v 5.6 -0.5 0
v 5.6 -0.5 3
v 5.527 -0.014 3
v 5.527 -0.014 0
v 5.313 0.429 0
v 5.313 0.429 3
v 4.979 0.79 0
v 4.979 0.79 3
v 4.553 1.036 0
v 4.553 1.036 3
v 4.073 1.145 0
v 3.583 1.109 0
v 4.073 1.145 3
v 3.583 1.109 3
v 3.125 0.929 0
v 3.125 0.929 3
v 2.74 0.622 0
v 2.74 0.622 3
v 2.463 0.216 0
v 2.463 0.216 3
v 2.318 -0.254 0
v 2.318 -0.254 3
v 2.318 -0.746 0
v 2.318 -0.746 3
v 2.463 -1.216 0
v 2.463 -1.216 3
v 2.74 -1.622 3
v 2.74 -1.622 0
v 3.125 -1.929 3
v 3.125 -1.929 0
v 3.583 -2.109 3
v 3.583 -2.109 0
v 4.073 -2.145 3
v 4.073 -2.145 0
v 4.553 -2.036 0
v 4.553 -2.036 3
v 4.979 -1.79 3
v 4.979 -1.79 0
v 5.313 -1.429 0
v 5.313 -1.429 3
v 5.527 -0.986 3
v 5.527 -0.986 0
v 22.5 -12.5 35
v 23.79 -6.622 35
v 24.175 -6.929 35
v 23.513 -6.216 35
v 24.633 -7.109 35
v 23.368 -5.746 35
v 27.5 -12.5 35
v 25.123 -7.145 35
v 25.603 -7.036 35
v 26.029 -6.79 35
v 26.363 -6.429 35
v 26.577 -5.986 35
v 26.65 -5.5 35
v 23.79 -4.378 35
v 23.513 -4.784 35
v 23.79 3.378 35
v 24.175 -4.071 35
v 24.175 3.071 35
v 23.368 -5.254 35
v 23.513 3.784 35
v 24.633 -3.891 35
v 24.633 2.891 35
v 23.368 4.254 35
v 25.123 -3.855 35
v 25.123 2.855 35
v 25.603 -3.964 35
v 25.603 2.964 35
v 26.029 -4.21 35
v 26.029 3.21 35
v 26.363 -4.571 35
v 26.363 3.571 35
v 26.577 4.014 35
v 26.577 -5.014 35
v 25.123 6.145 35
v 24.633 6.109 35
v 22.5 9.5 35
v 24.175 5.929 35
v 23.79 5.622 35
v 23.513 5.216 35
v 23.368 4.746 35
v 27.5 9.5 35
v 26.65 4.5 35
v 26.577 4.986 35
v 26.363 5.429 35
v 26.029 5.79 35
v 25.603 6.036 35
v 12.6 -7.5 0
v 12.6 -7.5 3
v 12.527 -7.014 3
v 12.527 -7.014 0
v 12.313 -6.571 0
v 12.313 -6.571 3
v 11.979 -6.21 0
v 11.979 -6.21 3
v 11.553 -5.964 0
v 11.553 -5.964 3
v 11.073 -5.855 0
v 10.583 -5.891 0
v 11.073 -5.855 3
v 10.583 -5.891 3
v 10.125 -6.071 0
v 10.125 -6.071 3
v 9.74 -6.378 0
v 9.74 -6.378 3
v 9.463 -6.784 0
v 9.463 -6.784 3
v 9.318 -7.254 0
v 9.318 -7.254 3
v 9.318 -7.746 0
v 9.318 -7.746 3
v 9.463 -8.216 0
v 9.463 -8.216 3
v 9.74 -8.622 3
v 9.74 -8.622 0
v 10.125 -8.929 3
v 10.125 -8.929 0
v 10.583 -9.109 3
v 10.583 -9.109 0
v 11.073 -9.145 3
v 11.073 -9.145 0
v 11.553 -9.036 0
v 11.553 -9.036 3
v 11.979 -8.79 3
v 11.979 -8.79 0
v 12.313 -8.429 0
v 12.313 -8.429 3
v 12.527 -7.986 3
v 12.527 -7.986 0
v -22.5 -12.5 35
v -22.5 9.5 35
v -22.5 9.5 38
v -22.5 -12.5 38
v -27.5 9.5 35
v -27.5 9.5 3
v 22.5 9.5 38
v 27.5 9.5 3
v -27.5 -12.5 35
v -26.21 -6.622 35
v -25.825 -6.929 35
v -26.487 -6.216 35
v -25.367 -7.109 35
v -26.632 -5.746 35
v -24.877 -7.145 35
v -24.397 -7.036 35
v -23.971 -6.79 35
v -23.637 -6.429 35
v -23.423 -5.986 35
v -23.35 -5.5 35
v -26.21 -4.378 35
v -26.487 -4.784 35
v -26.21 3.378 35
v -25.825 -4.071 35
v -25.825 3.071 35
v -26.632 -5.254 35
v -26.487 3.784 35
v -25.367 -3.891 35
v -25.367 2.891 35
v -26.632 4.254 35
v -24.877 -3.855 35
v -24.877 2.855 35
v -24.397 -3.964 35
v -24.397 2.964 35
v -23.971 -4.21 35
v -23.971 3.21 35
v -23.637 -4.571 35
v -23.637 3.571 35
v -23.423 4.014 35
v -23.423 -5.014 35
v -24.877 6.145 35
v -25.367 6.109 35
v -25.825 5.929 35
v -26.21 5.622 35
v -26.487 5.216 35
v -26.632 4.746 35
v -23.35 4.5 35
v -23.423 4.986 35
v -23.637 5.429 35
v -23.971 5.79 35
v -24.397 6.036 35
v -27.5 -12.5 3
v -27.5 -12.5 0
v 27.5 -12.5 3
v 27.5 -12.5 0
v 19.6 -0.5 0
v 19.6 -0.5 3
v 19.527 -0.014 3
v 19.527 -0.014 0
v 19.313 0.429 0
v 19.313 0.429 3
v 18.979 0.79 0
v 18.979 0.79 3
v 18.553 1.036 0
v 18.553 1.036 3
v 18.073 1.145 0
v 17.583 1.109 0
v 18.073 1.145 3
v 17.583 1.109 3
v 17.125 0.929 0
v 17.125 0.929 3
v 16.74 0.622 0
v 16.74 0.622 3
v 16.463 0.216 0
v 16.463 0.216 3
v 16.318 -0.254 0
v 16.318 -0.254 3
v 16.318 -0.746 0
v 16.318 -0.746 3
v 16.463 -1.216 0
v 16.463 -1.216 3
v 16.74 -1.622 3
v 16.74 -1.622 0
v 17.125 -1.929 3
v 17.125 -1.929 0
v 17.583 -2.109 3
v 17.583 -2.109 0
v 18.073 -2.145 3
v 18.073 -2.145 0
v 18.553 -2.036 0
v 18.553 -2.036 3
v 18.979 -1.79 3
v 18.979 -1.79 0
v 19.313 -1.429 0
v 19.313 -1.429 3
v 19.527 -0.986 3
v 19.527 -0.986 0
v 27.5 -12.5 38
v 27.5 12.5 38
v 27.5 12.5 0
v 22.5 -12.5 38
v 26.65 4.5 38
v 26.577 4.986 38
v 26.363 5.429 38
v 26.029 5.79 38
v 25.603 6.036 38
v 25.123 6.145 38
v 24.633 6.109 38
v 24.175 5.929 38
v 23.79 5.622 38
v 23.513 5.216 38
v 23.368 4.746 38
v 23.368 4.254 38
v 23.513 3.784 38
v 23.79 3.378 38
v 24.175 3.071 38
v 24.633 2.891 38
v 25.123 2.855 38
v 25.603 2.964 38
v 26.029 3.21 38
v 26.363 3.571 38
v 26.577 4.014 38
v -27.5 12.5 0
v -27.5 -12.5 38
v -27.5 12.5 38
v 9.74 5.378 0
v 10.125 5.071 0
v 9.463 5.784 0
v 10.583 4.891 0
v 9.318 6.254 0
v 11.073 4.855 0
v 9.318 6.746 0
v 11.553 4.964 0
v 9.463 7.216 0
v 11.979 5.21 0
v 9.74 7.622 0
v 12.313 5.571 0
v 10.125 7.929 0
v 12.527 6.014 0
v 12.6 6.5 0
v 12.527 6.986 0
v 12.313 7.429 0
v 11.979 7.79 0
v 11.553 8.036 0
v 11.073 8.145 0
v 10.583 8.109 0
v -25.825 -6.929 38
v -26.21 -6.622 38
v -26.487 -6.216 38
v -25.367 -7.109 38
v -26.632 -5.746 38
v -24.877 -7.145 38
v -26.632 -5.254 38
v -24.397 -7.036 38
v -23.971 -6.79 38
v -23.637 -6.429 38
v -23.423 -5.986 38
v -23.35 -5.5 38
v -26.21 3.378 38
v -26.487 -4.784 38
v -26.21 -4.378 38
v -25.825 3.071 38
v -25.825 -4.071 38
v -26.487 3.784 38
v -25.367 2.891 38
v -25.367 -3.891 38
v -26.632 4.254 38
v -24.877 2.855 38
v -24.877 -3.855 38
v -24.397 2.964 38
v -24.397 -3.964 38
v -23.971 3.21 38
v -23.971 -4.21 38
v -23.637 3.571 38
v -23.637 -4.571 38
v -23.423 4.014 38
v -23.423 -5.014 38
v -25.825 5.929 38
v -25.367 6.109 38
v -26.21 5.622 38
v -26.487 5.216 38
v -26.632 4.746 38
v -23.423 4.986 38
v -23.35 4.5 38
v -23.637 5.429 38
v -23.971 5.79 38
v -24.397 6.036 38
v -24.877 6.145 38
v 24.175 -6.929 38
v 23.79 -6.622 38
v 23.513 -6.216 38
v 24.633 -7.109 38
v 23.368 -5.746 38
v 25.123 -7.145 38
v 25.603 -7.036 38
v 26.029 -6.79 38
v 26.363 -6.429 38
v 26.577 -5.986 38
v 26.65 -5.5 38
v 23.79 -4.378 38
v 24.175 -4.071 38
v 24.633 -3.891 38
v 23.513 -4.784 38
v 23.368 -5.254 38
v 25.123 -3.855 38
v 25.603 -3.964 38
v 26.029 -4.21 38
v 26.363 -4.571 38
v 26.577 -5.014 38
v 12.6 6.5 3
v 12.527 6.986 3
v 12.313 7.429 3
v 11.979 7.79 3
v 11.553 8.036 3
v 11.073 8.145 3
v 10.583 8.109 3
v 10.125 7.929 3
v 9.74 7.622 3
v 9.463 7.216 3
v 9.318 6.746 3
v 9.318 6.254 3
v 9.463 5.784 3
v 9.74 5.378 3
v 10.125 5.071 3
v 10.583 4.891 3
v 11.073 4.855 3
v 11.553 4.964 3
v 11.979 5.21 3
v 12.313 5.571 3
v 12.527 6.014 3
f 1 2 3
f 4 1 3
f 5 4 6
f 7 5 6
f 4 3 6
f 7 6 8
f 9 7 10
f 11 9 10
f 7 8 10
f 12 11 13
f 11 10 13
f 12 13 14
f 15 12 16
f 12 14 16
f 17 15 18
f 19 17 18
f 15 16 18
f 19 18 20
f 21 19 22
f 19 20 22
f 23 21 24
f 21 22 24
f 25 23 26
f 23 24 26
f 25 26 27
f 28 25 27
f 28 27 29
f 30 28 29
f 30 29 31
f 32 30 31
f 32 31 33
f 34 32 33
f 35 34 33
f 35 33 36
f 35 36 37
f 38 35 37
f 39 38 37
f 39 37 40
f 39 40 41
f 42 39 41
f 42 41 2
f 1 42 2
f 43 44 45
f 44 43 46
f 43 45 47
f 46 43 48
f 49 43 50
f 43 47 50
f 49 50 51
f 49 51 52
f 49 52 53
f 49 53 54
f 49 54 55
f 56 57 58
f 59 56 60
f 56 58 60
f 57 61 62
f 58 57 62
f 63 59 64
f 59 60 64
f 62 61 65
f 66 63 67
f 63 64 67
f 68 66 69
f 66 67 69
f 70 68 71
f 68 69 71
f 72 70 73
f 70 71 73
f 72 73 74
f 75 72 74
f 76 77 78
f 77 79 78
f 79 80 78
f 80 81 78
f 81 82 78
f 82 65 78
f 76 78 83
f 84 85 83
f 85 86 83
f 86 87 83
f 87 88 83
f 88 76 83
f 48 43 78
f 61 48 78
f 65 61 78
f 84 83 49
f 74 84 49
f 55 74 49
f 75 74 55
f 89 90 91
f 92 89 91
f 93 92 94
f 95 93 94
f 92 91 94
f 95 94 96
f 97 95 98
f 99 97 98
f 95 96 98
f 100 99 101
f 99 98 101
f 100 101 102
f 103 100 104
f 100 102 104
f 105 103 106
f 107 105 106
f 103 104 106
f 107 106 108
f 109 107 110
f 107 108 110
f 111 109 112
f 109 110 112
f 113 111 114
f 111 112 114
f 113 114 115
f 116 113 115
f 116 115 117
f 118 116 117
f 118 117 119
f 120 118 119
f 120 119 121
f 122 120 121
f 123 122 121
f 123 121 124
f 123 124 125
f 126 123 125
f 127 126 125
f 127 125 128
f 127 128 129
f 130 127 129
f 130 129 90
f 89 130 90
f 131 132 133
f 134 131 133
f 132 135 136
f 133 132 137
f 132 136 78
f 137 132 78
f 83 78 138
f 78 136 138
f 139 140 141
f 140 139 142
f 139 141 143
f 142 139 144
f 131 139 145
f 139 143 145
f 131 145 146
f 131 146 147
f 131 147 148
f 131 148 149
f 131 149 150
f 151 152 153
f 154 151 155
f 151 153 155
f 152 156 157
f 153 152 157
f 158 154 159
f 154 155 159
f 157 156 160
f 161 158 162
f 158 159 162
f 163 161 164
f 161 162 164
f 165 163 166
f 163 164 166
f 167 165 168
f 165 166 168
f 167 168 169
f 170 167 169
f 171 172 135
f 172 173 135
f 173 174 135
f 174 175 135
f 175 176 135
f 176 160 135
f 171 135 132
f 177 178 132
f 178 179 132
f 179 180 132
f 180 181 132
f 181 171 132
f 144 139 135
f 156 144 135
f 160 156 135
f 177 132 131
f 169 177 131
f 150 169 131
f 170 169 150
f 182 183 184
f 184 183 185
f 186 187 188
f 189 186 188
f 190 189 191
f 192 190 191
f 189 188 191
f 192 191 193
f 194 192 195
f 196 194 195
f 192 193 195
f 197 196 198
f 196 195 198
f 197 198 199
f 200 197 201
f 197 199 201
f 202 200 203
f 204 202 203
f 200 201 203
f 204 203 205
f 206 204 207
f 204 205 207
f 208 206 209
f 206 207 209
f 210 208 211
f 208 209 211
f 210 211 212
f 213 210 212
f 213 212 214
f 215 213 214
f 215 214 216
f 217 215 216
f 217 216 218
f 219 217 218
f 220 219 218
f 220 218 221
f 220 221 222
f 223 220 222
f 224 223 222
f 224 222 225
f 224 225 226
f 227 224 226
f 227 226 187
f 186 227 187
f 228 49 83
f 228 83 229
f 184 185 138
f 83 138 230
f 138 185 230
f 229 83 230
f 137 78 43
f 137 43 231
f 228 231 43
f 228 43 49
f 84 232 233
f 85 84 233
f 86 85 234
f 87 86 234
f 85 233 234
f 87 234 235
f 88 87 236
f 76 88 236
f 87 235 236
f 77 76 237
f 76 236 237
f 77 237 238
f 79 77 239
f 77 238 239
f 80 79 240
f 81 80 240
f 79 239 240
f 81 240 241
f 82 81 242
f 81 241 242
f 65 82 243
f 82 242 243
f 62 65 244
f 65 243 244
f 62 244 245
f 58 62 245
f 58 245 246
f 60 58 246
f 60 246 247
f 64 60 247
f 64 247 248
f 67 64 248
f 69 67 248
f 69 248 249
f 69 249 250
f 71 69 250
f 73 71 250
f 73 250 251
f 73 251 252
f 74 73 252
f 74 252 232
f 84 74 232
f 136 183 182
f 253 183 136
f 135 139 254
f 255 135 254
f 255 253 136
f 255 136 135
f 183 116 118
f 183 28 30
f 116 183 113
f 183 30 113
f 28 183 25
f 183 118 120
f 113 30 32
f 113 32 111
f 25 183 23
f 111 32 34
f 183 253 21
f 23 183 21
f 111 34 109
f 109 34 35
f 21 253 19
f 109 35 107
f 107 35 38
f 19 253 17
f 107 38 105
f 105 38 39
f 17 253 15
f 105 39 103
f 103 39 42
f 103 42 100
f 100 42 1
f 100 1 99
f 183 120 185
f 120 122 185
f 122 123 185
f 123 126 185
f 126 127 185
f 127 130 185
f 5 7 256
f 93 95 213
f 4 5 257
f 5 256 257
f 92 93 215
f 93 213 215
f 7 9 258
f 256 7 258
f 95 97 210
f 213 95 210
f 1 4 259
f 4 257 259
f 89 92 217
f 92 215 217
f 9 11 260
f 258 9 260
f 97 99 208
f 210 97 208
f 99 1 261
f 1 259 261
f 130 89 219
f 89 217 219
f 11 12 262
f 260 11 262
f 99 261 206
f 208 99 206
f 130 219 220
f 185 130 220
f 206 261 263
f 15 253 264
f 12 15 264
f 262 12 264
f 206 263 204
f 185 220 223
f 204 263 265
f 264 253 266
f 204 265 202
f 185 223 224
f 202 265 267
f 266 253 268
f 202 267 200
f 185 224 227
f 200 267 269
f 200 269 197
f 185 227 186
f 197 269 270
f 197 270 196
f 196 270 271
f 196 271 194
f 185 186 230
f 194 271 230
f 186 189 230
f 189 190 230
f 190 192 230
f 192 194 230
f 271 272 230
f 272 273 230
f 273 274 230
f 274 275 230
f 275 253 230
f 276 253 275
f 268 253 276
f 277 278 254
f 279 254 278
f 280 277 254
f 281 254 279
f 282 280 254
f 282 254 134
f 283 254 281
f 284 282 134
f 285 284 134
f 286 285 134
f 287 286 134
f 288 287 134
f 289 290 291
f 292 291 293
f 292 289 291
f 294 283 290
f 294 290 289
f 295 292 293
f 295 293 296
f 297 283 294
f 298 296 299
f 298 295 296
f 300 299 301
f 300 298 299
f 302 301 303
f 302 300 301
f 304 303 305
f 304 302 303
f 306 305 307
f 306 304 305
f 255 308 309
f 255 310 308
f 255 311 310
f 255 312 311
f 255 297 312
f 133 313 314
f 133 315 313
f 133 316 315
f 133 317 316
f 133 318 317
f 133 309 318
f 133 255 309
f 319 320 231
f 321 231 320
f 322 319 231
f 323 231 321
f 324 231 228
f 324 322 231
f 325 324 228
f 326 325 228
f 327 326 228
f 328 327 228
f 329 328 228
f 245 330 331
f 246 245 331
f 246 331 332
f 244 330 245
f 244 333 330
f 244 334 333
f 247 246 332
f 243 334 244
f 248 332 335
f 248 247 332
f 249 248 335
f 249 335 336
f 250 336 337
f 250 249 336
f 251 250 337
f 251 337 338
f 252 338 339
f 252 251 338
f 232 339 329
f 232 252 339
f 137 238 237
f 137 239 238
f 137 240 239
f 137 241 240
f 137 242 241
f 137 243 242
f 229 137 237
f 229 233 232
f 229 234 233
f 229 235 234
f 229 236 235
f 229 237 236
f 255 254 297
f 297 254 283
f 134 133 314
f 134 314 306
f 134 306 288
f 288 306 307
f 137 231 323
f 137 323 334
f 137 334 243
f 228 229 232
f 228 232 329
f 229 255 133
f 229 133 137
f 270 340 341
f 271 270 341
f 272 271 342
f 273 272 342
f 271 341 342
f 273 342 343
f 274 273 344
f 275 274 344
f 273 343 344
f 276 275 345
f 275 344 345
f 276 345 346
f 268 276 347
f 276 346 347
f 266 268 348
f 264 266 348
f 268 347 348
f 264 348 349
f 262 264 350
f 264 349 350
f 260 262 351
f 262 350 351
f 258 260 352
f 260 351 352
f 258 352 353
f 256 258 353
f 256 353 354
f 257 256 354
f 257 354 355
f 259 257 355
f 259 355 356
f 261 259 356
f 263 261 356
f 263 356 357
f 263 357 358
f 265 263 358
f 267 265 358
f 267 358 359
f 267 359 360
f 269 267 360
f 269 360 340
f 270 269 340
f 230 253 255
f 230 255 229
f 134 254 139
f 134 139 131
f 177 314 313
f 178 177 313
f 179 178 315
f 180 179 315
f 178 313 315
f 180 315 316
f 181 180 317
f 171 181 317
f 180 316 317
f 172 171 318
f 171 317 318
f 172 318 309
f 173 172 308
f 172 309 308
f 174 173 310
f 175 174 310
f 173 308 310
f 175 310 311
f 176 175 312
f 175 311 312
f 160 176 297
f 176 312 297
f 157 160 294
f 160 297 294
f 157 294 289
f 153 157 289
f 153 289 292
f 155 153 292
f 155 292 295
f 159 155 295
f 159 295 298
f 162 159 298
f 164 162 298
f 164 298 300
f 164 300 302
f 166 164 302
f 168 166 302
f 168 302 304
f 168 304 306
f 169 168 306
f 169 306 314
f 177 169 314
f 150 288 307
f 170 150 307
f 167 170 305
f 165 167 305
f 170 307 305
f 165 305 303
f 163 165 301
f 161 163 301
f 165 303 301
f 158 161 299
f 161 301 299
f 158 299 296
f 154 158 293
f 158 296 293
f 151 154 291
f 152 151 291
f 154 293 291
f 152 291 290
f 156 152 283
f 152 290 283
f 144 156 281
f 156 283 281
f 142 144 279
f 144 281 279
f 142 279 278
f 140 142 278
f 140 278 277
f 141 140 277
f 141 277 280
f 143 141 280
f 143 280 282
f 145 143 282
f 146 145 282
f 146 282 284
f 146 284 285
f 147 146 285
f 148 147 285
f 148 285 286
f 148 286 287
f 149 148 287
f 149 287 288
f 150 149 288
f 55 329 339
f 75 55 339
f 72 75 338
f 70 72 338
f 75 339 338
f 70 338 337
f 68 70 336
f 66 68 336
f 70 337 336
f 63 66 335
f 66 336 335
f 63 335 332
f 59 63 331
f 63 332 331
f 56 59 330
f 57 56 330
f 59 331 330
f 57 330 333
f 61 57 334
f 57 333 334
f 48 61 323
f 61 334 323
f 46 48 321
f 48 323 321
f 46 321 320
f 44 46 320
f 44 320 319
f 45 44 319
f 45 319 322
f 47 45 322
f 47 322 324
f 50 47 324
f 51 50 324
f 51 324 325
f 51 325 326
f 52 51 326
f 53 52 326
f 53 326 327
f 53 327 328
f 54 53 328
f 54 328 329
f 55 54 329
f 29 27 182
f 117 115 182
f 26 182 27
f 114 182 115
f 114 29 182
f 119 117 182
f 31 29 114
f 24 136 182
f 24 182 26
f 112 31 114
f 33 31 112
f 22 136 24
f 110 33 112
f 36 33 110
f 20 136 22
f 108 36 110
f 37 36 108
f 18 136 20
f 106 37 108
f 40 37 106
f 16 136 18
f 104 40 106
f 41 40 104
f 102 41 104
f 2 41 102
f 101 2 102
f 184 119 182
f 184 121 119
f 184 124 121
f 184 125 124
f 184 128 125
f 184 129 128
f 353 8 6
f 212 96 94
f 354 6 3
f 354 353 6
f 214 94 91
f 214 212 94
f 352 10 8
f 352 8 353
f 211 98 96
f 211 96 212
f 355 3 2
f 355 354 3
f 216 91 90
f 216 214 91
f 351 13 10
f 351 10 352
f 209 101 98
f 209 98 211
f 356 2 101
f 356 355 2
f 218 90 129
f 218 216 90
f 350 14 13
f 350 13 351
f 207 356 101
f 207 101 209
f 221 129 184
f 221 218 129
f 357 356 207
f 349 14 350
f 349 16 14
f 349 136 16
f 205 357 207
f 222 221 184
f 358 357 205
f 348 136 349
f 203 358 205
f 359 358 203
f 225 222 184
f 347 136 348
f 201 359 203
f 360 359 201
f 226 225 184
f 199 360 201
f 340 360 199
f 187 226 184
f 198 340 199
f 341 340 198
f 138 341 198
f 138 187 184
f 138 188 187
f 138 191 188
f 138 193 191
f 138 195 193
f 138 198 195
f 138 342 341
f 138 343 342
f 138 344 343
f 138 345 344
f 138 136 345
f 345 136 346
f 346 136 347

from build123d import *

# Parameters (mm, degrees)
SKETCH_1_W          = 55
SKETCH_1_H          = 25
EXTRUDE_1_DEPTH     = 3
SKETCH_2_W          = 55
SKETCH_2_H          = 3
EXTRUDE_2_DEPTH     = 35
SKETCH_3_W          = 5
SKETCH_3_H          = 3
EXTRUDE_3_DEPTH     = 22
CUT_EXTRUDE_1_REACH = 50.544
SKETCH_4_R          = 1.65
SKETCH_7_R          = 1.65
CUT_EXTRUDE_2_DEPTH = 20


with BuildPart() as part:
    # 草图1 → 凸台-拉伸1 (new body)
    with BuildSketch(Plane.XY):
        Rectangle(SKETCH_1_W, SKETCH_1_H)
    extrude(amount=EXTRUDE_1_DEPTH)

    # 草图2 → 凸台-拉伸2 (add)
    with BuildSketch(Plane.XY.offset(3)):
        with Locations((0, 11)):
            Rectangle(SKETCH_2_W, SKETCH_2_H)
    extrude(amount=EXTRUDE_2_DEPTH)

    # 草图3 → 凸台-拉伸3 (add)
    with BuildSketch(Plane.XZ.offset(-9.5)):
        with Locations((-25, 36.5)):
            Rectangle(SKETCH_3_W, SKETCH_3_H)
        with Locations((25, 36.5)):
            Rectangle(SKETCH_3_W, SKETCH_3_H)
    extrude(amount=EXTRUDE_3_DEPTH)

    # 草图4 → 切除-拉伸1 (cut, up to next)
    with BuildSketch(Plane.XY.offset(38), mode=Mode.PRIVATE) as cut_extrude_1_sk1:
        with Locations((-25, -5.5)):
            Circle(SKETCH_4_R)
    cut_extrude_1_tool1 = extrude(cut_extrude_1_sk1.sketch, amount=-CUT_EXTRUDE_1_REACH, mode=Mode.PRIVATE) & part.part
    # 草图4 → 切除-拉伸1 (cut, up to next)
    with BuildSketch(Plane.XY.offset(38), mode=Mode.PRIVATE) as cut_extrude_1_sk2:
        with Locations((-25, 4.5)):
            Circle(SKETCH_4_R)
    cut_extrude_1_tool2 = extrude(cut_extrude_1_sk2.sketch, amount=-CUT_EXTRUDE_1_REACH, mode=Mode.PRIVATE) & part.part
    # 草图4 → 切除-拉伸1 (cut, up to next)
    with BuildSketch(Plane.XY.offset(38), mode=Mode.PRIVATE) as cut_extrude_1_sk3:
        with Locations((25, 4.5)):
            Circle(SKETCH_4_R)
    cut_extrude_1_tool3 = extrude(cut_extrude_1_sk3.sketch, amount=-CUT_EXTRUDE_1_REACH, mode=Mode.PRIVATE) & part.part
    # 草图4 → 切除-拉伸1 (cut, up to next)
    with BuildSketch(Plane.XY.offset(38), mode=Mode.PRIVATE) as cut_extrude_1_sk4:
        with Locations((25, -5.5)):
            Circle(SKETCH_4_R)
    cut_extrude_1_tool4 = extrude(cut_extrude_1_sk4.sketch, amount=-CUT_EXTRUDE_1_REACH, mode=Mode.PRIVATE) & part.part
    add(cut_extrude_1_tool1.solids().sort_by_distance((-25, -5.5, 38))[0], mode=Mode.SUBTRACT)
    add(cut_extrude_1_tool2.solids().sort_by_distance((-25, 4.5, 38))[0], mode=Mode.SUBTRACT)
    add(cut_extrude_1_tool3.solids().sort_by_distance((25, 4.5, 38))[0], mode=Mode.SUBTRACT)
    add(cut_extrude_1_tool4.solids().sort_by_distance((25, -5.5, 38))[0], mode=Mode.SUBTRACT)

    # 草图7 → 切除-拉伸2 (cut)
    with BuildSketch(Plane.XY.offset(3)):
        with Locations((17.95, -0.5)):
            Circle(SKETCH_7_R)
        with Locations((10.95, 6.5)):
            Circle(SKETCH_7_R)
        with Locations((3.95, -0.5)):
            Circle(SKETCH_7_R)
        with Locations((10.95, -7.5)):
            Circle(SKETCH_7_R)
    extrude(amount=-CUT_EXTRUDE_2_DEPTH, mode=Mode.SUBTRACT)


solid = part.part
